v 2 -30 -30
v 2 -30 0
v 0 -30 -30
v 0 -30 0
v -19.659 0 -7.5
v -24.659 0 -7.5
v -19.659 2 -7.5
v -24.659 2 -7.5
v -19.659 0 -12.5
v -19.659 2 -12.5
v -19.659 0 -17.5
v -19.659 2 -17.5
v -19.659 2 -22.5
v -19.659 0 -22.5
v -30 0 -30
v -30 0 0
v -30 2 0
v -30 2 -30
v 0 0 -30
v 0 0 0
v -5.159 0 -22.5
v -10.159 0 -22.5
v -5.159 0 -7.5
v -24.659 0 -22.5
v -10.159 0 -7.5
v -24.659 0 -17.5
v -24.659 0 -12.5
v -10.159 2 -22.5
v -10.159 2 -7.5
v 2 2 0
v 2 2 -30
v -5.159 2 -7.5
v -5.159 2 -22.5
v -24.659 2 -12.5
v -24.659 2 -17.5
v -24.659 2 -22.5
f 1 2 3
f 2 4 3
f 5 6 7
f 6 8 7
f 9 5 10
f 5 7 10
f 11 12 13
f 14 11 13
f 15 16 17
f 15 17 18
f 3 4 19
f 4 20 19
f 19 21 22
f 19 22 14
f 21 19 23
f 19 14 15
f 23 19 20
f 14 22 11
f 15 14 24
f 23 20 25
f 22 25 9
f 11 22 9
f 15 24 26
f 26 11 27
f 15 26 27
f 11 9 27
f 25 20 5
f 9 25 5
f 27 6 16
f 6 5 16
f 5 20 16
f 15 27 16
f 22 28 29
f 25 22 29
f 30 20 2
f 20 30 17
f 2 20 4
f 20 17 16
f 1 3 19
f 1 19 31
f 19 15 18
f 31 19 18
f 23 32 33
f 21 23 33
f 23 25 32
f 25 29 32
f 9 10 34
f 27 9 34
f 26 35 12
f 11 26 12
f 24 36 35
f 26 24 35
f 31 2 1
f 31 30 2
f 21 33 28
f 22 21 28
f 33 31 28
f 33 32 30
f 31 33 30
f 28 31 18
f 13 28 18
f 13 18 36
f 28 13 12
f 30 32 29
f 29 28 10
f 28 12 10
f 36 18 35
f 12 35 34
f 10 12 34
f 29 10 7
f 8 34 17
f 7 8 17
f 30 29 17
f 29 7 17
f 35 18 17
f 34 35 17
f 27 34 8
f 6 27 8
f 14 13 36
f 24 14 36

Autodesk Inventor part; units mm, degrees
ref_plane "YZ Plane" through (0, 0, 0) normal (1, 0, 0) x (0, 1, 0)
ref_plane "XZ Plane" through (0, 0, 0) normal (0, 1, 0) x (-1, 0, 0)
ref_plane "XY Plane" through (0, 0, 0) normal (0, 0, 1) x (1, 0, 0)
sketch "Sketch1" plane through (0, 0, 0) normal (0, 1, 0) x (-1, 0, 0)
  line L0 (0, 0) -> (30, 0)
  line L1 (30, 0) -> (30, -30)
  line L2 (30, -30) -> (0, -30)
  line L3 (0, -30) -> (0, 0)
  dimension "d0" = 30
  dimension "d1" = 30
extrude "Extrusion1" add sketch "Sketch1" along normal blind 2
sketch "Sketch2" plane through (0, 2, 0) normal (0, 1, 0) x (1, 0, 0)
  line L0 (-24.6588, 7.5) -> (-19.6588, 7.5)
  line L1 (-19.6588, 7.5) -> (-19.6588, 12.5)
  line L2 (-19.6588, 12.5) -> (-24.6588, 12.5)
  line L3 (-24.6588, 12.5) -> (-24.6588, 7.5)
  line L4 (-30, 0) -> (0, 0) projected
  line L5 (-24.6588, 17.5) -> (-19.6588, 17.5)
  line L6 (-19.6588, 17.5) -> (-19.6588, 22.5)
  line L7 (-19.6588, 22.5) -> (-24.6588, 22.5)
  line L8 (-24.6588, 22.5) -> (-24.6588, 17.5)
  line L9 (-10.1588, 7.5) -> (-5.1588, 7.5)
  line L10 (-5.1588, 7.5) -> (-5.1588, 22.5)
  line L11 (-5.1588, 22.5) -> (-10.1588, 22.5)
  line L12 (-10.1588, 22.5) -> (-10.1588, 7.5)
  dimension "d4" = 5
  dimension "d5" = 5
  dimension "d6" = 7.5
  dimension "d7" = 5
  dimension "d8" = 5
  dimension "d9" = 5
  dimension "d10" = 9.5
extrude "Extrusion2" cut sketch "Sketch2" against normal blind 2
sketch "Sketch3" plane through (0, 0, 0) normal (1, 0, 0) x (0, 0, -1)
  line L0 (30, 2) -> (0, 2) projected
  line L1 (30, 2) -> (0, 2)
  line L2 (0, 2) -> (0, -30)
  line L3 (0, -30) -> (30, -30)
  line L4 (30, -30) -> (30, 2)
  dimension "d15" = 32
extrude "Extrusion3" add sketch "Sketch3" along normal blind 2
properties part number "Head"
